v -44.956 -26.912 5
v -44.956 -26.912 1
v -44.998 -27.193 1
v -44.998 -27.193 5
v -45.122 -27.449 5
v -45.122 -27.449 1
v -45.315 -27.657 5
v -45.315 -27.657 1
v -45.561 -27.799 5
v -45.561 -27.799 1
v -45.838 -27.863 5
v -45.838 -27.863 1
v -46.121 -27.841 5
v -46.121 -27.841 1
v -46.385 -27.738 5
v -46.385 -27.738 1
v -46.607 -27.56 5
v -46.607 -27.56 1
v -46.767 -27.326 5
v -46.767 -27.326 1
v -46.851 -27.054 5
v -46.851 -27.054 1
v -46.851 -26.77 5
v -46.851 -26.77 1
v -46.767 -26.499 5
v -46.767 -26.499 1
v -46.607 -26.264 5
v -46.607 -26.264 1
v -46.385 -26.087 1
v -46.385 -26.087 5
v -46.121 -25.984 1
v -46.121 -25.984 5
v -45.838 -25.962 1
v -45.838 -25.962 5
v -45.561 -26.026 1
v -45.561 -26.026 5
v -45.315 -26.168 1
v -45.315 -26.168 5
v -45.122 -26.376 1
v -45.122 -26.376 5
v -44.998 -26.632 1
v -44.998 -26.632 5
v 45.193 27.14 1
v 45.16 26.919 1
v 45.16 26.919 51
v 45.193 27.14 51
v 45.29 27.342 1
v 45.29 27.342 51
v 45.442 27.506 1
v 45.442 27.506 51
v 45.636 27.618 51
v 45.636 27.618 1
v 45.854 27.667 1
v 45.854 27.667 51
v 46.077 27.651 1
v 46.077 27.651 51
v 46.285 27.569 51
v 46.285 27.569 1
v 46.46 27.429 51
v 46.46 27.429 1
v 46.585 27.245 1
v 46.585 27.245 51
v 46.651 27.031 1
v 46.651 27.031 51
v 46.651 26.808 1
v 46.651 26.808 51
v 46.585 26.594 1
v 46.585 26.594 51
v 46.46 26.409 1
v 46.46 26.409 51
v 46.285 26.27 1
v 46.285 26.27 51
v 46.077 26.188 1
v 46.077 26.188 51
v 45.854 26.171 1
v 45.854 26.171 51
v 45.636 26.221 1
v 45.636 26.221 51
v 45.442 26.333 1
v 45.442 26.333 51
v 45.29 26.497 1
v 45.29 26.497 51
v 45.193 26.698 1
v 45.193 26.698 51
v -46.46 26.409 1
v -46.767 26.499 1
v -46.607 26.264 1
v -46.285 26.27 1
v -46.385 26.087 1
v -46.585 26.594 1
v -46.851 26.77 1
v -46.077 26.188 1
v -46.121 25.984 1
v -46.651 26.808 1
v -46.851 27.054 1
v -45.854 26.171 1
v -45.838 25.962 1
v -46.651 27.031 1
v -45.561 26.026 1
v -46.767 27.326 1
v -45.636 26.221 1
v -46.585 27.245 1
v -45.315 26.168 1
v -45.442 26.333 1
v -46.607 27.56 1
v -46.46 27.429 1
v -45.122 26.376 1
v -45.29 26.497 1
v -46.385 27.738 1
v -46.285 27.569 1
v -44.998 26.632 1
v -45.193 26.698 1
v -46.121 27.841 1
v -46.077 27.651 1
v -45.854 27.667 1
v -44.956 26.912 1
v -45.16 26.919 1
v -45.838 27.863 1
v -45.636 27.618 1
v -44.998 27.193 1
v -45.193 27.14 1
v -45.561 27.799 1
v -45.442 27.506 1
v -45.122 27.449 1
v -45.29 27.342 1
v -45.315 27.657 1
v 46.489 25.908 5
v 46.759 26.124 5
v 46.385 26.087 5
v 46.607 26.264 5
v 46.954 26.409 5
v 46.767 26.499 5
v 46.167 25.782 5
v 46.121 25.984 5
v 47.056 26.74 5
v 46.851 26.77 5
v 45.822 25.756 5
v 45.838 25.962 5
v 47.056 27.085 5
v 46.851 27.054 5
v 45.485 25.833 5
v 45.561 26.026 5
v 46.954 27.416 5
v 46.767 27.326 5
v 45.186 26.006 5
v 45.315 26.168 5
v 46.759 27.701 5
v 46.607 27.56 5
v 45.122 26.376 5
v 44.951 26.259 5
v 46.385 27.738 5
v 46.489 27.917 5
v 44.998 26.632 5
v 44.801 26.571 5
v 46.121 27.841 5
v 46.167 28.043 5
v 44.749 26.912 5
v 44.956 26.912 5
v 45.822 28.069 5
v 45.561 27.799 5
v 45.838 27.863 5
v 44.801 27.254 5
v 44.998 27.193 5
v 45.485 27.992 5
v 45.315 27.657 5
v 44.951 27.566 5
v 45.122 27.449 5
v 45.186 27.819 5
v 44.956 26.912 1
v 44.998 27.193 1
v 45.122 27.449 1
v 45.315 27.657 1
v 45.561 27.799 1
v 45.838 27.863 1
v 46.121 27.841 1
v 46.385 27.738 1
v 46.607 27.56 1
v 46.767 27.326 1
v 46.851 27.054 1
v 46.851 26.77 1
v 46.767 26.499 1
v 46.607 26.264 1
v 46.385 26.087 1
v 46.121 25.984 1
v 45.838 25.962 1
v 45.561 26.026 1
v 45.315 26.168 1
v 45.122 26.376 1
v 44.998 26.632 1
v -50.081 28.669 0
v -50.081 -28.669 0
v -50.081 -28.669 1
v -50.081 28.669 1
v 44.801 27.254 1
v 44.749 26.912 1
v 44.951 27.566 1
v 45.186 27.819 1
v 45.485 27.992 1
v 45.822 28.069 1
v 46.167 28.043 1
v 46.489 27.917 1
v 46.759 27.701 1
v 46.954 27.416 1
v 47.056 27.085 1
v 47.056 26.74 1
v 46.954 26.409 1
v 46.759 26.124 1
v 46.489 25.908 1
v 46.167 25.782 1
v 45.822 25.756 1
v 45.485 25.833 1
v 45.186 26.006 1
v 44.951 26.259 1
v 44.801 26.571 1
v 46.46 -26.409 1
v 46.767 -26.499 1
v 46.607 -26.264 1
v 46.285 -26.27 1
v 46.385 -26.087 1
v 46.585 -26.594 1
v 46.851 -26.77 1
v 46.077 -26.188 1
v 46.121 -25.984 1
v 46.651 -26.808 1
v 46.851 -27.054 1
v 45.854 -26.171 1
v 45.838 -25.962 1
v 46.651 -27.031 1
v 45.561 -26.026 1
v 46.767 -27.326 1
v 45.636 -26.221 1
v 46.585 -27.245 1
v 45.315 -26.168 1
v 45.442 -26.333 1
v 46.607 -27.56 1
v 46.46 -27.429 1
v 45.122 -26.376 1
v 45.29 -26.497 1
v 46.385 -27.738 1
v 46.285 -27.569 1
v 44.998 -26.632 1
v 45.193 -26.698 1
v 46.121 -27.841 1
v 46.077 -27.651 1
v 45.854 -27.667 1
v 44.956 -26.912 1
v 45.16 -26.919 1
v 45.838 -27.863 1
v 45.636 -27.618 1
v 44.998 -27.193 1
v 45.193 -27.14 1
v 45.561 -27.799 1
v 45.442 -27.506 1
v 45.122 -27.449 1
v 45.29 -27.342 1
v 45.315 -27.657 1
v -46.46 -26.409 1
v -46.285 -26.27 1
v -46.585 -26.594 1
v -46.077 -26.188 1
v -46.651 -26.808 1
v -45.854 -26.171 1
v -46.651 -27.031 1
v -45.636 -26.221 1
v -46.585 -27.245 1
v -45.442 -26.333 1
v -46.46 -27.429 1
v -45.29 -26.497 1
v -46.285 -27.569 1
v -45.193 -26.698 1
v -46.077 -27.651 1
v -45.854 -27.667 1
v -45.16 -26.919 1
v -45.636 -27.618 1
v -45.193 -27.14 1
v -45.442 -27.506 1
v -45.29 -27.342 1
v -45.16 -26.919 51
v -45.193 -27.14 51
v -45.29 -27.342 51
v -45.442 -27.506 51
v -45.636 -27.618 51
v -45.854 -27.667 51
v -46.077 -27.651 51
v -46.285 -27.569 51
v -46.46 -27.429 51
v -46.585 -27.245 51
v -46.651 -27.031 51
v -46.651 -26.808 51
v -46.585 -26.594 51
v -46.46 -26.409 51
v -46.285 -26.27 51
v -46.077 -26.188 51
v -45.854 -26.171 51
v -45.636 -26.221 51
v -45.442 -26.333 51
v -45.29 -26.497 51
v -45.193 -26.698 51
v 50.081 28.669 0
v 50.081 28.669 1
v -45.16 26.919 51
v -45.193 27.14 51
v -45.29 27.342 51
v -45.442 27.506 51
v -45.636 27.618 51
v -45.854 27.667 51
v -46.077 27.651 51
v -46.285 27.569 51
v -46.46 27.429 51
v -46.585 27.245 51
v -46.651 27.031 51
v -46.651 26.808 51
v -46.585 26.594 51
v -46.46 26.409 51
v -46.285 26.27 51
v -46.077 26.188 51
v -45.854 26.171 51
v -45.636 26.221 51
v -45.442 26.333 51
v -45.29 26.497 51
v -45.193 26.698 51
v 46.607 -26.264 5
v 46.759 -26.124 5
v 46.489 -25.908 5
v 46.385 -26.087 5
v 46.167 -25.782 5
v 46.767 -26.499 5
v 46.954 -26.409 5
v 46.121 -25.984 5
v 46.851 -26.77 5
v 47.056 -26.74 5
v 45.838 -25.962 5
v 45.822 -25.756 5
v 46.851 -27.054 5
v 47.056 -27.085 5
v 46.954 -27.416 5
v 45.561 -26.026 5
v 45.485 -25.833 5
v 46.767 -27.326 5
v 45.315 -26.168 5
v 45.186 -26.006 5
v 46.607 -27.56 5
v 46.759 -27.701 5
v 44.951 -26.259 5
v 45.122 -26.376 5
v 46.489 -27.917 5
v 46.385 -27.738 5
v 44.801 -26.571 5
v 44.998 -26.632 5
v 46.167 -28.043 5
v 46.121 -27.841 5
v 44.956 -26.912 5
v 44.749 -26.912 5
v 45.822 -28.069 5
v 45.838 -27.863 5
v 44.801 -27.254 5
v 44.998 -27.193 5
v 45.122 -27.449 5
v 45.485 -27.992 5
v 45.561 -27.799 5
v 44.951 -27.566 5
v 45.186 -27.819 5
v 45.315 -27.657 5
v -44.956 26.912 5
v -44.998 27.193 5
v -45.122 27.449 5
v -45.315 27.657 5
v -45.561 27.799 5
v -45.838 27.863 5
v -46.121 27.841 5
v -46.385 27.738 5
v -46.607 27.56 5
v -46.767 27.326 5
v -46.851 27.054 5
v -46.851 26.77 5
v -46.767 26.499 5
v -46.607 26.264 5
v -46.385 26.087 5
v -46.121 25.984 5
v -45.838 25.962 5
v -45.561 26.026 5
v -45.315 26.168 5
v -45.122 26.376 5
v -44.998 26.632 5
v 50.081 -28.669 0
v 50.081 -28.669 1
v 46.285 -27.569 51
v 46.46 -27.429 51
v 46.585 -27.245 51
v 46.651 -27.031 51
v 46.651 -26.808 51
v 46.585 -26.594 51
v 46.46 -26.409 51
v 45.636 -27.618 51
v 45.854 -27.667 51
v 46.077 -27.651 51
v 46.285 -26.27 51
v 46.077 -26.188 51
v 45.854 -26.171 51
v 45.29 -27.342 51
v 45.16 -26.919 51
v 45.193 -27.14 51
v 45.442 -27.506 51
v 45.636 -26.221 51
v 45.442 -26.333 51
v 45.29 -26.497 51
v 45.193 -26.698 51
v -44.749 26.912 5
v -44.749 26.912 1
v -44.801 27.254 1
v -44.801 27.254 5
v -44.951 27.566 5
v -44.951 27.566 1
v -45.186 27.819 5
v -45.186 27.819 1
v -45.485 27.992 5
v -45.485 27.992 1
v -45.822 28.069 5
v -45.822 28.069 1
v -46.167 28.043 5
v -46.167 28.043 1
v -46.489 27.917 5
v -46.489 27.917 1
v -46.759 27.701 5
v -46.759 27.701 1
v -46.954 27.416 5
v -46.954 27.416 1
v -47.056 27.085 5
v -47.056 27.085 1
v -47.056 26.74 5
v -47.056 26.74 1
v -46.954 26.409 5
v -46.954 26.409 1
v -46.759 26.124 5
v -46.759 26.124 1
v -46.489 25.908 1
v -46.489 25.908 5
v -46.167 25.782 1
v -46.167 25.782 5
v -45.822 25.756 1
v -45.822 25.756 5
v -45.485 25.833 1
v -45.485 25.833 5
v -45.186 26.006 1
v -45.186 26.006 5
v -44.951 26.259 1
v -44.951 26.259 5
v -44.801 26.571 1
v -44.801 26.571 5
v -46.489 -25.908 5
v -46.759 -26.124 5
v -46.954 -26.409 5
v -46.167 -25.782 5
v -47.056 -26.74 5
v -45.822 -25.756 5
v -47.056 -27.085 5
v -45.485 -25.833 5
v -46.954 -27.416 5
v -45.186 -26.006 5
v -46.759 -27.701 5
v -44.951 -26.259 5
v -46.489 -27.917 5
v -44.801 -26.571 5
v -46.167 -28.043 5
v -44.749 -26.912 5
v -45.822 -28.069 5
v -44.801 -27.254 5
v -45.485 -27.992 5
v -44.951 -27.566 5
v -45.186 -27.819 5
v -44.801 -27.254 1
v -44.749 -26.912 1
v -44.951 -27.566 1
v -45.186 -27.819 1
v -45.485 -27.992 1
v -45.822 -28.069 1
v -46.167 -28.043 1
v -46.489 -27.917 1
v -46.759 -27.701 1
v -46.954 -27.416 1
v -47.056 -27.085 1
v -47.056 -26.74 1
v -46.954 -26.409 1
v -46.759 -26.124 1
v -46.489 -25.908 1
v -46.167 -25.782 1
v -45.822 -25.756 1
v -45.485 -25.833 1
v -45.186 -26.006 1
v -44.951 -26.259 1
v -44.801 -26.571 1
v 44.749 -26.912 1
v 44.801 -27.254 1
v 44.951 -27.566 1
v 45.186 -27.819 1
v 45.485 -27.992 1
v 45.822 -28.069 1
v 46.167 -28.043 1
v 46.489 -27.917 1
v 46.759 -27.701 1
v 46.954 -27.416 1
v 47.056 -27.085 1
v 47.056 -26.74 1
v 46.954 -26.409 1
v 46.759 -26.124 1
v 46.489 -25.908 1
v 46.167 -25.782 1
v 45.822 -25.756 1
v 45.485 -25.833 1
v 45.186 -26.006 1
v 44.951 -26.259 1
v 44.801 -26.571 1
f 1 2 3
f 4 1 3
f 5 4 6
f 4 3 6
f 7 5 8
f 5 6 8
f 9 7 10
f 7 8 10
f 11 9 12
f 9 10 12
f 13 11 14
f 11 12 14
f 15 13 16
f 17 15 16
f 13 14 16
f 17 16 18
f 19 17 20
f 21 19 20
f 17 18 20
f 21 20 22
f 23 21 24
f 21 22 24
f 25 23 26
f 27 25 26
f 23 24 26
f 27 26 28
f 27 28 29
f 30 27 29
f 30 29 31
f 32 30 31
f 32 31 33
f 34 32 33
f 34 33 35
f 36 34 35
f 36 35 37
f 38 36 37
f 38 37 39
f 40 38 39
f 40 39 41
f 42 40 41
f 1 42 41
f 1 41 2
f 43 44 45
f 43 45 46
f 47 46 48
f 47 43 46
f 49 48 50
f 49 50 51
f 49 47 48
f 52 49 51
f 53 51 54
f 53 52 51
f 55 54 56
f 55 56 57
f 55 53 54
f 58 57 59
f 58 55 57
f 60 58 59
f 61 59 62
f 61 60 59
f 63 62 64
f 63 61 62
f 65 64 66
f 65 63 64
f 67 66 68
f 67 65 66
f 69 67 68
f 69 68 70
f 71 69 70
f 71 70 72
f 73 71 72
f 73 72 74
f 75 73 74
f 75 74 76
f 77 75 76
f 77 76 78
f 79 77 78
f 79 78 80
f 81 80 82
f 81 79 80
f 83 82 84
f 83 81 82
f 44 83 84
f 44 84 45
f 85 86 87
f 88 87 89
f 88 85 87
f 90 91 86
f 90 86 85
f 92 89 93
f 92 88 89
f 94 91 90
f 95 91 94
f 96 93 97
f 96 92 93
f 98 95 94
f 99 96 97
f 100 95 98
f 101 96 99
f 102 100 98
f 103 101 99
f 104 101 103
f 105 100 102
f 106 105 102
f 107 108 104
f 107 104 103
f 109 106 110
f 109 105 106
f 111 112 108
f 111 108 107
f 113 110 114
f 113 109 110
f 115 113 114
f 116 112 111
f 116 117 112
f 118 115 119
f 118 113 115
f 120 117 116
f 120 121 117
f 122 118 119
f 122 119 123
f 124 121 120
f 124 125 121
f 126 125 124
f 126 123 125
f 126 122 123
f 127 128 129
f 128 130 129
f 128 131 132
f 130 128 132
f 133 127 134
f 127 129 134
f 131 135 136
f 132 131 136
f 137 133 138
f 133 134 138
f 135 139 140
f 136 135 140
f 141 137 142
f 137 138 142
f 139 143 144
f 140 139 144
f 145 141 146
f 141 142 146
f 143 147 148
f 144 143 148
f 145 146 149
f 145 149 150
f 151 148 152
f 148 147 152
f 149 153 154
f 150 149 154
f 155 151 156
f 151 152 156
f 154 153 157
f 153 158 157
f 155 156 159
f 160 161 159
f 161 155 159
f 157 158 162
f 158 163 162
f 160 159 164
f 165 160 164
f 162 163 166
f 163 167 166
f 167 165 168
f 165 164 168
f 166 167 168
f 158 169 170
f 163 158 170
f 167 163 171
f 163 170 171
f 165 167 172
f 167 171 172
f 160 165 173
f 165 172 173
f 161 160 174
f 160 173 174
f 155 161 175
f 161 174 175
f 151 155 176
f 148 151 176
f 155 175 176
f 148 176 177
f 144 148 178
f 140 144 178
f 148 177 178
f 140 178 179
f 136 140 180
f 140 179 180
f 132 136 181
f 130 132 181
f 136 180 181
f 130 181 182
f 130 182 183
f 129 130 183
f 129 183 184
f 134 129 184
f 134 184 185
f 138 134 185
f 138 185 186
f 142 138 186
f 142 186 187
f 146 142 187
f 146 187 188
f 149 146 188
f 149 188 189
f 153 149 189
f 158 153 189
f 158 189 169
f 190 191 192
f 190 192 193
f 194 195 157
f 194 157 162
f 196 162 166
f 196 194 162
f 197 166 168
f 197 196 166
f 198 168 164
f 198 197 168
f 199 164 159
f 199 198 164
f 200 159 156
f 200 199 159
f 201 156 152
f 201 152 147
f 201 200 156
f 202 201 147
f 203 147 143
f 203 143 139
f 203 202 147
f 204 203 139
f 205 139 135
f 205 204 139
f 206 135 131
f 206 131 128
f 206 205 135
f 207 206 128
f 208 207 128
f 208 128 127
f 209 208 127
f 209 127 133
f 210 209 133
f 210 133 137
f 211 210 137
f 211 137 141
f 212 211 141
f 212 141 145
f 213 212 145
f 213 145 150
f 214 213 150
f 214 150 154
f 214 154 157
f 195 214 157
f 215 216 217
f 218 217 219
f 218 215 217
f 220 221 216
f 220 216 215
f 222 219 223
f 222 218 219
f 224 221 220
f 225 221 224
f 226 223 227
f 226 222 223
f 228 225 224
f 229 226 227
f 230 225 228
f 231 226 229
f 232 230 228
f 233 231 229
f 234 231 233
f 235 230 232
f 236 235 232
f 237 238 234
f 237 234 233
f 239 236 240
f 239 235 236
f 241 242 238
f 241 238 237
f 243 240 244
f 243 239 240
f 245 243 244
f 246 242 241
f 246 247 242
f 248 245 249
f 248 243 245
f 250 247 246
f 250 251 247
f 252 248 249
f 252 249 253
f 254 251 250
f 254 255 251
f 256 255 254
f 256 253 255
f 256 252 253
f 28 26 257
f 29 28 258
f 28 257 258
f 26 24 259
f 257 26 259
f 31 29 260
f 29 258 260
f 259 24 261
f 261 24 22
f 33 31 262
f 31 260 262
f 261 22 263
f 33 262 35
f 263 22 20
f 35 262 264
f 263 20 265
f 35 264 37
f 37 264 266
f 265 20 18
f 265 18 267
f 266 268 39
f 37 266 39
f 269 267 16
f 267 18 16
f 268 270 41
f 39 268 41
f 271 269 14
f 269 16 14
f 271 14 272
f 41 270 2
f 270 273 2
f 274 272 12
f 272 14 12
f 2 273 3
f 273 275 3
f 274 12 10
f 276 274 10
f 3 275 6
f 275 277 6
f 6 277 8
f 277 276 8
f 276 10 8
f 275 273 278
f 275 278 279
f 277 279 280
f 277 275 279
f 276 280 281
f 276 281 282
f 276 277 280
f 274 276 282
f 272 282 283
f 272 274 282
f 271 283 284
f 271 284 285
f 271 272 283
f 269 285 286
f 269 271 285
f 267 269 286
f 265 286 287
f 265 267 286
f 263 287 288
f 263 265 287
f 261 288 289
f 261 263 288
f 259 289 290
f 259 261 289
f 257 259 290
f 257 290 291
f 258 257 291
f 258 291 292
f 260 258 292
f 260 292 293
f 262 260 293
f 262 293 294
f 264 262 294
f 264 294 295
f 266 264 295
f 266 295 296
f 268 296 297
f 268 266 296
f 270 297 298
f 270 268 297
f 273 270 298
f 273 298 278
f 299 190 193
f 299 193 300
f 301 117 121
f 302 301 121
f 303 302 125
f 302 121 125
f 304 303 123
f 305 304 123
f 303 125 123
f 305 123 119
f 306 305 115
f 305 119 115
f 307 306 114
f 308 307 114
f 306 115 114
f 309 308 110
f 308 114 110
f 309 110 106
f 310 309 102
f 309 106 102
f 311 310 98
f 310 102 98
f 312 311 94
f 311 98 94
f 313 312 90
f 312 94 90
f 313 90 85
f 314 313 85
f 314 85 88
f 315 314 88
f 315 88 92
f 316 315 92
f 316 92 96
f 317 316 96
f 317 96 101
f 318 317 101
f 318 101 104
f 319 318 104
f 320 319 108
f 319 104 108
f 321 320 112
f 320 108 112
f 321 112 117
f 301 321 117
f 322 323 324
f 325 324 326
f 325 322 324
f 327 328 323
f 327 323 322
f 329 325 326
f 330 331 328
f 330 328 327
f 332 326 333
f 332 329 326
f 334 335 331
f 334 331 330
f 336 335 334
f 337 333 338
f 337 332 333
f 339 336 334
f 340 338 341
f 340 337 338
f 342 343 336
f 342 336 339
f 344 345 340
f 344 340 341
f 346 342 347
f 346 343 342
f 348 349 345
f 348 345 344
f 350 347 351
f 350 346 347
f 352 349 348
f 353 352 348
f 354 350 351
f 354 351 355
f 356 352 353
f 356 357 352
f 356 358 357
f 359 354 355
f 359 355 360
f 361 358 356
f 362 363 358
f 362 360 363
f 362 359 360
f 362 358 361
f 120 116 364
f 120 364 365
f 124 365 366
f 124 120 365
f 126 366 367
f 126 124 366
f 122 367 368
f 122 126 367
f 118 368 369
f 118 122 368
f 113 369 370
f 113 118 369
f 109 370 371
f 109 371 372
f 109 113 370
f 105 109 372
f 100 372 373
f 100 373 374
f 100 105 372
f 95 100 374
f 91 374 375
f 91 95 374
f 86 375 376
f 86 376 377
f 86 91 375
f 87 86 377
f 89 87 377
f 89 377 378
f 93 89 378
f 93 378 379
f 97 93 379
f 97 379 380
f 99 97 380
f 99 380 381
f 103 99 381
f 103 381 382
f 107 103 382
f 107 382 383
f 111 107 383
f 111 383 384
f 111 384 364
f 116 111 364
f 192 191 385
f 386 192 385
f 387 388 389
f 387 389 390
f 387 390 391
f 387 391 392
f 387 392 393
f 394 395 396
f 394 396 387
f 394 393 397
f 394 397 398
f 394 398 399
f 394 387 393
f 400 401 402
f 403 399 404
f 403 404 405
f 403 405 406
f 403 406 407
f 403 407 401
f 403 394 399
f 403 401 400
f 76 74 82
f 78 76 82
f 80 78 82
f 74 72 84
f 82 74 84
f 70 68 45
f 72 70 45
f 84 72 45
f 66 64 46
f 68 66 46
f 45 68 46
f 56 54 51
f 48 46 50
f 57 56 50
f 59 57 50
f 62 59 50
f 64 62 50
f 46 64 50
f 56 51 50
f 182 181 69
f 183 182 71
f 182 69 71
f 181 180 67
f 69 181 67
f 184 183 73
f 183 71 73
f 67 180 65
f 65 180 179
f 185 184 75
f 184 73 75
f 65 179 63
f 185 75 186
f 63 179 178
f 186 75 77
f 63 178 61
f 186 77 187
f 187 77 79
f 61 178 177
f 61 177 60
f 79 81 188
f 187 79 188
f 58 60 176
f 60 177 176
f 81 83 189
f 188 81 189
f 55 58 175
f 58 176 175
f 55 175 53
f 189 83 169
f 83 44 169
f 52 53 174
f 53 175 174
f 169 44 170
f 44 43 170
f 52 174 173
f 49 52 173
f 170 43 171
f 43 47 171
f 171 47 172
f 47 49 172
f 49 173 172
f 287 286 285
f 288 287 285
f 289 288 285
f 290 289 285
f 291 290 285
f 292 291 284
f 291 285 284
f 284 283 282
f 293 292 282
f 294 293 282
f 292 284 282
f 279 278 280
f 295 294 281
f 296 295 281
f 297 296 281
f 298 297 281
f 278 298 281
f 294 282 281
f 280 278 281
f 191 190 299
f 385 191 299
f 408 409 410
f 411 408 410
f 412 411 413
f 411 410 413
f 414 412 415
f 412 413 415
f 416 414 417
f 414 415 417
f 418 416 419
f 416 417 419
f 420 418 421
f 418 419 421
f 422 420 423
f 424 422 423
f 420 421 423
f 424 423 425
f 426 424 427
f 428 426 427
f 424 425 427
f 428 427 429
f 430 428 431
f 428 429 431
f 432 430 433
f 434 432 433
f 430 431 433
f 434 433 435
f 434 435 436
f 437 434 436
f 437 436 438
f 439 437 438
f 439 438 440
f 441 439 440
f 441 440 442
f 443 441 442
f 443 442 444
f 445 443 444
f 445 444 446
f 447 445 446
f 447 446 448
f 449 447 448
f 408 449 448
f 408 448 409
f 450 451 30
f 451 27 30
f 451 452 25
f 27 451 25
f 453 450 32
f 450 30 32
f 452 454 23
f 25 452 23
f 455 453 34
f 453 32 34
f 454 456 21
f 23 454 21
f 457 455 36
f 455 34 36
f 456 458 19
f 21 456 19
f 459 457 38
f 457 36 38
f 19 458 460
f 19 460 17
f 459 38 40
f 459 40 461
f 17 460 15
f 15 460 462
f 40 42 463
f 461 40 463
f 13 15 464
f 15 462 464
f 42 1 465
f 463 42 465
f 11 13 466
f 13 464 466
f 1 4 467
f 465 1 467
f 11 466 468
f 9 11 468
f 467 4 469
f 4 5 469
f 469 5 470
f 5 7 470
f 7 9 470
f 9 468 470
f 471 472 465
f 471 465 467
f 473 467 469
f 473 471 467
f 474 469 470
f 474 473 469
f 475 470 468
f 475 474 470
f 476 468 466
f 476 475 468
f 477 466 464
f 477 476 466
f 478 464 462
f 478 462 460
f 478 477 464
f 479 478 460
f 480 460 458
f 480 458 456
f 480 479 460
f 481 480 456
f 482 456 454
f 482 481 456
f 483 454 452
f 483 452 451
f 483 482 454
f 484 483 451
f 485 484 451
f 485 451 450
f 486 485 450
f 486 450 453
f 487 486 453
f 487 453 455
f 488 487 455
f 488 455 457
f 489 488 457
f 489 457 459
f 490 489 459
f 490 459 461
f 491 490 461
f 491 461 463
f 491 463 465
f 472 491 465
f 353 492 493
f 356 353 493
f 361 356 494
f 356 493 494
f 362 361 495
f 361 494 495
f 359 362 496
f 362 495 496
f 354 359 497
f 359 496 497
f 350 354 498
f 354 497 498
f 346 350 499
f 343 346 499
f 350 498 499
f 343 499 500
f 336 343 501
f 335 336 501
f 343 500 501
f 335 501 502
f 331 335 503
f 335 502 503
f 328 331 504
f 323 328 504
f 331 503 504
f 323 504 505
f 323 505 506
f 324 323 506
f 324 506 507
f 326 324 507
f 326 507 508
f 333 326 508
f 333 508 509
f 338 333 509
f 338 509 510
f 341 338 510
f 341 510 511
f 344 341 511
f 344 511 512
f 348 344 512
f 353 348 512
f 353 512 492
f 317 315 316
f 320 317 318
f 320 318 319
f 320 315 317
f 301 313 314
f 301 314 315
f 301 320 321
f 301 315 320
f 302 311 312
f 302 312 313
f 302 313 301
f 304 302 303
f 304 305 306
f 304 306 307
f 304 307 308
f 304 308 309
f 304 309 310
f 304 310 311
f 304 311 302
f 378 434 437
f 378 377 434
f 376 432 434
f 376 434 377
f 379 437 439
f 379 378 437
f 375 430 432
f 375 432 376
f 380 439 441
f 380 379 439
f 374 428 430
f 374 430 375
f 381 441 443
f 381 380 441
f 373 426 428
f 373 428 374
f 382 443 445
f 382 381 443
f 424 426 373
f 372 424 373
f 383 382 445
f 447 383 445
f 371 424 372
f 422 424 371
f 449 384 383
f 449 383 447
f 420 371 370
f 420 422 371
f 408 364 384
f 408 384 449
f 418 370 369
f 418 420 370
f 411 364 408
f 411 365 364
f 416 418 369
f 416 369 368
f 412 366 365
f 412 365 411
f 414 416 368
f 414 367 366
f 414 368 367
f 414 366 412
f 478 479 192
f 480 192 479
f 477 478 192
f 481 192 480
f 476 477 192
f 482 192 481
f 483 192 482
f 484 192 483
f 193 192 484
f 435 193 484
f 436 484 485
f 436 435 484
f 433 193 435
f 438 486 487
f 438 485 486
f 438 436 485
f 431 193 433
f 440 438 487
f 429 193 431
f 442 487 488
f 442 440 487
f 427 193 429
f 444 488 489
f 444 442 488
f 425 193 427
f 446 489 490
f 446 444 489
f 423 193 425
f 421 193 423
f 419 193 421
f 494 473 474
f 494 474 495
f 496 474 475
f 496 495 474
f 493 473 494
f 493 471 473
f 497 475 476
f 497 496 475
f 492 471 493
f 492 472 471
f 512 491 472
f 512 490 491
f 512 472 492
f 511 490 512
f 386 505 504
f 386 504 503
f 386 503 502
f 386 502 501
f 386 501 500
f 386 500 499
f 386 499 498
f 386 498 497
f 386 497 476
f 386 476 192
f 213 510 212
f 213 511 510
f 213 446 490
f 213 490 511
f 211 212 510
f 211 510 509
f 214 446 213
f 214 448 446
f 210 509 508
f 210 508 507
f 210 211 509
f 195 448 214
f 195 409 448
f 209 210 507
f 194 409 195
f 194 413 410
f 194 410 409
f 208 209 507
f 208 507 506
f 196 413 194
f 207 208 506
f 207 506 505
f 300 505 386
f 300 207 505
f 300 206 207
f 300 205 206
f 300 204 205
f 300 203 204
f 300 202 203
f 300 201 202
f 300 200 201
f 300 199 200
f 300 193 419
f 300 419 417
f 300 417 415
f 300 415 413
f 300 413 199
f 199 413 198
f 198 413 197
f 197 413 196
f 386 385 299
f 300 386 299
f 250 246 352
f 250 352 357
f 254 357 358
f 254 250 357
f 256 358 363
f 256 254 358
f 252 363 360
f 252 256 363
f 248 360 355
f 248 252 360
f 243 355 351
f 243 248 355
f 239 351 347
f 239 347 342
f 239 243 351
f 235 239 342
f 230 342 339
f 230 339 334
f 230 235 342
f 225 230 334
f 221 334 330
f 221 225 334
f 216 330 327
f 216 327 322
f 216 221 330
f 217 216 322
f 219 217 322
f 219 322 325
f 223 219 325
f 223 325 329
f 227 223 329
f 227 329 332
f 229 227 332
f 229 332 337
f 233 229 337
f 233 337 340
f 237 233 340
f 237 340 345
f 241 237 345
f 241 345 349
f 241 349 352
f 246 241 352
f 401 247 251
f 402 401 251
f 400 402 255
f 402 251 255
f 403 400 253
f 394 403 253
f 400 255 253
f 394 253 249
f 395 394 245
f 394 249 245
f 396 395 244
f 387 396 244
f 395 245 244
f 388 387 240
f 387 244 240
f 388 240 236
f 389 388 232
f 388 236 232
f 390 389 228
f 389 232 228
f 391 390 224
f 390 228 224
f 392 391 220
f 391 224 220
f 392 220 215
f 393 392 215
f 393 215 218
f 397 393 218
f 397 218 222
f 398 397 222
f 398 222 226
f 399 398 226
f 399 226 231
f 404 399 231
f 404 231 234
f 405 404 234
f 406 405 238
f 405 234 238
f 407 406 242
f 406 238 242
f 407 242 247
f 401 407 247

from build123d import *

# Parameters (mm, degrees)
F0_W     = 100.1612991095
F0_H     = 57.3387145996
F1_DEPTH = 1
F4_R     = 0.75
F5_DEPTH = 50
F6_R     = 1.159755705
F6_R_2   = 0.9527404517
F7_DEPTH = 5


# Not quite as in the source:
# - a feature names something its author has since deleted; it is built from what else it names


with BuildPart() as f1:
    # F0 (on Top) → F1 (new body)
    with BuildSketch(Plane.XY):
        Rectangle(F0_W, F0_H)
    extrude(amount=F1_DEPTH)

    # F4 (on face) → F5 (join)
    with BuildSketch(Plane.XY.offset(1)):
        with Locations((-45.9097400308, 26.9193572998)):
            Circle(F4_R)
    extrude(amount=F5_DEPTH)

    # F6 (on Top) → F7 (join)
    with BuildSketch(Plane.XY):
        with Locations((-45.9088794887, 26.9124545157)):
            Circle(F6_R)
        with Locations((-45.9088794887, 26.9124545157)):
            Circle(F6_R_2, mode=Mode.SUBTRACT)
    extrude(amount=F7_DEPTH)

    # F8: F1 across plane


with BuildPart() as f1_1:
    add(f1.part)
    add(f1.part.mirror(Plane.XZ))

    # F9: F1 across plane


with BuildPart() as f1_2:
    add(f1_1.part)
    add(f1_1.part.mirror(Plane.YZ))


solid = f1_2.part
